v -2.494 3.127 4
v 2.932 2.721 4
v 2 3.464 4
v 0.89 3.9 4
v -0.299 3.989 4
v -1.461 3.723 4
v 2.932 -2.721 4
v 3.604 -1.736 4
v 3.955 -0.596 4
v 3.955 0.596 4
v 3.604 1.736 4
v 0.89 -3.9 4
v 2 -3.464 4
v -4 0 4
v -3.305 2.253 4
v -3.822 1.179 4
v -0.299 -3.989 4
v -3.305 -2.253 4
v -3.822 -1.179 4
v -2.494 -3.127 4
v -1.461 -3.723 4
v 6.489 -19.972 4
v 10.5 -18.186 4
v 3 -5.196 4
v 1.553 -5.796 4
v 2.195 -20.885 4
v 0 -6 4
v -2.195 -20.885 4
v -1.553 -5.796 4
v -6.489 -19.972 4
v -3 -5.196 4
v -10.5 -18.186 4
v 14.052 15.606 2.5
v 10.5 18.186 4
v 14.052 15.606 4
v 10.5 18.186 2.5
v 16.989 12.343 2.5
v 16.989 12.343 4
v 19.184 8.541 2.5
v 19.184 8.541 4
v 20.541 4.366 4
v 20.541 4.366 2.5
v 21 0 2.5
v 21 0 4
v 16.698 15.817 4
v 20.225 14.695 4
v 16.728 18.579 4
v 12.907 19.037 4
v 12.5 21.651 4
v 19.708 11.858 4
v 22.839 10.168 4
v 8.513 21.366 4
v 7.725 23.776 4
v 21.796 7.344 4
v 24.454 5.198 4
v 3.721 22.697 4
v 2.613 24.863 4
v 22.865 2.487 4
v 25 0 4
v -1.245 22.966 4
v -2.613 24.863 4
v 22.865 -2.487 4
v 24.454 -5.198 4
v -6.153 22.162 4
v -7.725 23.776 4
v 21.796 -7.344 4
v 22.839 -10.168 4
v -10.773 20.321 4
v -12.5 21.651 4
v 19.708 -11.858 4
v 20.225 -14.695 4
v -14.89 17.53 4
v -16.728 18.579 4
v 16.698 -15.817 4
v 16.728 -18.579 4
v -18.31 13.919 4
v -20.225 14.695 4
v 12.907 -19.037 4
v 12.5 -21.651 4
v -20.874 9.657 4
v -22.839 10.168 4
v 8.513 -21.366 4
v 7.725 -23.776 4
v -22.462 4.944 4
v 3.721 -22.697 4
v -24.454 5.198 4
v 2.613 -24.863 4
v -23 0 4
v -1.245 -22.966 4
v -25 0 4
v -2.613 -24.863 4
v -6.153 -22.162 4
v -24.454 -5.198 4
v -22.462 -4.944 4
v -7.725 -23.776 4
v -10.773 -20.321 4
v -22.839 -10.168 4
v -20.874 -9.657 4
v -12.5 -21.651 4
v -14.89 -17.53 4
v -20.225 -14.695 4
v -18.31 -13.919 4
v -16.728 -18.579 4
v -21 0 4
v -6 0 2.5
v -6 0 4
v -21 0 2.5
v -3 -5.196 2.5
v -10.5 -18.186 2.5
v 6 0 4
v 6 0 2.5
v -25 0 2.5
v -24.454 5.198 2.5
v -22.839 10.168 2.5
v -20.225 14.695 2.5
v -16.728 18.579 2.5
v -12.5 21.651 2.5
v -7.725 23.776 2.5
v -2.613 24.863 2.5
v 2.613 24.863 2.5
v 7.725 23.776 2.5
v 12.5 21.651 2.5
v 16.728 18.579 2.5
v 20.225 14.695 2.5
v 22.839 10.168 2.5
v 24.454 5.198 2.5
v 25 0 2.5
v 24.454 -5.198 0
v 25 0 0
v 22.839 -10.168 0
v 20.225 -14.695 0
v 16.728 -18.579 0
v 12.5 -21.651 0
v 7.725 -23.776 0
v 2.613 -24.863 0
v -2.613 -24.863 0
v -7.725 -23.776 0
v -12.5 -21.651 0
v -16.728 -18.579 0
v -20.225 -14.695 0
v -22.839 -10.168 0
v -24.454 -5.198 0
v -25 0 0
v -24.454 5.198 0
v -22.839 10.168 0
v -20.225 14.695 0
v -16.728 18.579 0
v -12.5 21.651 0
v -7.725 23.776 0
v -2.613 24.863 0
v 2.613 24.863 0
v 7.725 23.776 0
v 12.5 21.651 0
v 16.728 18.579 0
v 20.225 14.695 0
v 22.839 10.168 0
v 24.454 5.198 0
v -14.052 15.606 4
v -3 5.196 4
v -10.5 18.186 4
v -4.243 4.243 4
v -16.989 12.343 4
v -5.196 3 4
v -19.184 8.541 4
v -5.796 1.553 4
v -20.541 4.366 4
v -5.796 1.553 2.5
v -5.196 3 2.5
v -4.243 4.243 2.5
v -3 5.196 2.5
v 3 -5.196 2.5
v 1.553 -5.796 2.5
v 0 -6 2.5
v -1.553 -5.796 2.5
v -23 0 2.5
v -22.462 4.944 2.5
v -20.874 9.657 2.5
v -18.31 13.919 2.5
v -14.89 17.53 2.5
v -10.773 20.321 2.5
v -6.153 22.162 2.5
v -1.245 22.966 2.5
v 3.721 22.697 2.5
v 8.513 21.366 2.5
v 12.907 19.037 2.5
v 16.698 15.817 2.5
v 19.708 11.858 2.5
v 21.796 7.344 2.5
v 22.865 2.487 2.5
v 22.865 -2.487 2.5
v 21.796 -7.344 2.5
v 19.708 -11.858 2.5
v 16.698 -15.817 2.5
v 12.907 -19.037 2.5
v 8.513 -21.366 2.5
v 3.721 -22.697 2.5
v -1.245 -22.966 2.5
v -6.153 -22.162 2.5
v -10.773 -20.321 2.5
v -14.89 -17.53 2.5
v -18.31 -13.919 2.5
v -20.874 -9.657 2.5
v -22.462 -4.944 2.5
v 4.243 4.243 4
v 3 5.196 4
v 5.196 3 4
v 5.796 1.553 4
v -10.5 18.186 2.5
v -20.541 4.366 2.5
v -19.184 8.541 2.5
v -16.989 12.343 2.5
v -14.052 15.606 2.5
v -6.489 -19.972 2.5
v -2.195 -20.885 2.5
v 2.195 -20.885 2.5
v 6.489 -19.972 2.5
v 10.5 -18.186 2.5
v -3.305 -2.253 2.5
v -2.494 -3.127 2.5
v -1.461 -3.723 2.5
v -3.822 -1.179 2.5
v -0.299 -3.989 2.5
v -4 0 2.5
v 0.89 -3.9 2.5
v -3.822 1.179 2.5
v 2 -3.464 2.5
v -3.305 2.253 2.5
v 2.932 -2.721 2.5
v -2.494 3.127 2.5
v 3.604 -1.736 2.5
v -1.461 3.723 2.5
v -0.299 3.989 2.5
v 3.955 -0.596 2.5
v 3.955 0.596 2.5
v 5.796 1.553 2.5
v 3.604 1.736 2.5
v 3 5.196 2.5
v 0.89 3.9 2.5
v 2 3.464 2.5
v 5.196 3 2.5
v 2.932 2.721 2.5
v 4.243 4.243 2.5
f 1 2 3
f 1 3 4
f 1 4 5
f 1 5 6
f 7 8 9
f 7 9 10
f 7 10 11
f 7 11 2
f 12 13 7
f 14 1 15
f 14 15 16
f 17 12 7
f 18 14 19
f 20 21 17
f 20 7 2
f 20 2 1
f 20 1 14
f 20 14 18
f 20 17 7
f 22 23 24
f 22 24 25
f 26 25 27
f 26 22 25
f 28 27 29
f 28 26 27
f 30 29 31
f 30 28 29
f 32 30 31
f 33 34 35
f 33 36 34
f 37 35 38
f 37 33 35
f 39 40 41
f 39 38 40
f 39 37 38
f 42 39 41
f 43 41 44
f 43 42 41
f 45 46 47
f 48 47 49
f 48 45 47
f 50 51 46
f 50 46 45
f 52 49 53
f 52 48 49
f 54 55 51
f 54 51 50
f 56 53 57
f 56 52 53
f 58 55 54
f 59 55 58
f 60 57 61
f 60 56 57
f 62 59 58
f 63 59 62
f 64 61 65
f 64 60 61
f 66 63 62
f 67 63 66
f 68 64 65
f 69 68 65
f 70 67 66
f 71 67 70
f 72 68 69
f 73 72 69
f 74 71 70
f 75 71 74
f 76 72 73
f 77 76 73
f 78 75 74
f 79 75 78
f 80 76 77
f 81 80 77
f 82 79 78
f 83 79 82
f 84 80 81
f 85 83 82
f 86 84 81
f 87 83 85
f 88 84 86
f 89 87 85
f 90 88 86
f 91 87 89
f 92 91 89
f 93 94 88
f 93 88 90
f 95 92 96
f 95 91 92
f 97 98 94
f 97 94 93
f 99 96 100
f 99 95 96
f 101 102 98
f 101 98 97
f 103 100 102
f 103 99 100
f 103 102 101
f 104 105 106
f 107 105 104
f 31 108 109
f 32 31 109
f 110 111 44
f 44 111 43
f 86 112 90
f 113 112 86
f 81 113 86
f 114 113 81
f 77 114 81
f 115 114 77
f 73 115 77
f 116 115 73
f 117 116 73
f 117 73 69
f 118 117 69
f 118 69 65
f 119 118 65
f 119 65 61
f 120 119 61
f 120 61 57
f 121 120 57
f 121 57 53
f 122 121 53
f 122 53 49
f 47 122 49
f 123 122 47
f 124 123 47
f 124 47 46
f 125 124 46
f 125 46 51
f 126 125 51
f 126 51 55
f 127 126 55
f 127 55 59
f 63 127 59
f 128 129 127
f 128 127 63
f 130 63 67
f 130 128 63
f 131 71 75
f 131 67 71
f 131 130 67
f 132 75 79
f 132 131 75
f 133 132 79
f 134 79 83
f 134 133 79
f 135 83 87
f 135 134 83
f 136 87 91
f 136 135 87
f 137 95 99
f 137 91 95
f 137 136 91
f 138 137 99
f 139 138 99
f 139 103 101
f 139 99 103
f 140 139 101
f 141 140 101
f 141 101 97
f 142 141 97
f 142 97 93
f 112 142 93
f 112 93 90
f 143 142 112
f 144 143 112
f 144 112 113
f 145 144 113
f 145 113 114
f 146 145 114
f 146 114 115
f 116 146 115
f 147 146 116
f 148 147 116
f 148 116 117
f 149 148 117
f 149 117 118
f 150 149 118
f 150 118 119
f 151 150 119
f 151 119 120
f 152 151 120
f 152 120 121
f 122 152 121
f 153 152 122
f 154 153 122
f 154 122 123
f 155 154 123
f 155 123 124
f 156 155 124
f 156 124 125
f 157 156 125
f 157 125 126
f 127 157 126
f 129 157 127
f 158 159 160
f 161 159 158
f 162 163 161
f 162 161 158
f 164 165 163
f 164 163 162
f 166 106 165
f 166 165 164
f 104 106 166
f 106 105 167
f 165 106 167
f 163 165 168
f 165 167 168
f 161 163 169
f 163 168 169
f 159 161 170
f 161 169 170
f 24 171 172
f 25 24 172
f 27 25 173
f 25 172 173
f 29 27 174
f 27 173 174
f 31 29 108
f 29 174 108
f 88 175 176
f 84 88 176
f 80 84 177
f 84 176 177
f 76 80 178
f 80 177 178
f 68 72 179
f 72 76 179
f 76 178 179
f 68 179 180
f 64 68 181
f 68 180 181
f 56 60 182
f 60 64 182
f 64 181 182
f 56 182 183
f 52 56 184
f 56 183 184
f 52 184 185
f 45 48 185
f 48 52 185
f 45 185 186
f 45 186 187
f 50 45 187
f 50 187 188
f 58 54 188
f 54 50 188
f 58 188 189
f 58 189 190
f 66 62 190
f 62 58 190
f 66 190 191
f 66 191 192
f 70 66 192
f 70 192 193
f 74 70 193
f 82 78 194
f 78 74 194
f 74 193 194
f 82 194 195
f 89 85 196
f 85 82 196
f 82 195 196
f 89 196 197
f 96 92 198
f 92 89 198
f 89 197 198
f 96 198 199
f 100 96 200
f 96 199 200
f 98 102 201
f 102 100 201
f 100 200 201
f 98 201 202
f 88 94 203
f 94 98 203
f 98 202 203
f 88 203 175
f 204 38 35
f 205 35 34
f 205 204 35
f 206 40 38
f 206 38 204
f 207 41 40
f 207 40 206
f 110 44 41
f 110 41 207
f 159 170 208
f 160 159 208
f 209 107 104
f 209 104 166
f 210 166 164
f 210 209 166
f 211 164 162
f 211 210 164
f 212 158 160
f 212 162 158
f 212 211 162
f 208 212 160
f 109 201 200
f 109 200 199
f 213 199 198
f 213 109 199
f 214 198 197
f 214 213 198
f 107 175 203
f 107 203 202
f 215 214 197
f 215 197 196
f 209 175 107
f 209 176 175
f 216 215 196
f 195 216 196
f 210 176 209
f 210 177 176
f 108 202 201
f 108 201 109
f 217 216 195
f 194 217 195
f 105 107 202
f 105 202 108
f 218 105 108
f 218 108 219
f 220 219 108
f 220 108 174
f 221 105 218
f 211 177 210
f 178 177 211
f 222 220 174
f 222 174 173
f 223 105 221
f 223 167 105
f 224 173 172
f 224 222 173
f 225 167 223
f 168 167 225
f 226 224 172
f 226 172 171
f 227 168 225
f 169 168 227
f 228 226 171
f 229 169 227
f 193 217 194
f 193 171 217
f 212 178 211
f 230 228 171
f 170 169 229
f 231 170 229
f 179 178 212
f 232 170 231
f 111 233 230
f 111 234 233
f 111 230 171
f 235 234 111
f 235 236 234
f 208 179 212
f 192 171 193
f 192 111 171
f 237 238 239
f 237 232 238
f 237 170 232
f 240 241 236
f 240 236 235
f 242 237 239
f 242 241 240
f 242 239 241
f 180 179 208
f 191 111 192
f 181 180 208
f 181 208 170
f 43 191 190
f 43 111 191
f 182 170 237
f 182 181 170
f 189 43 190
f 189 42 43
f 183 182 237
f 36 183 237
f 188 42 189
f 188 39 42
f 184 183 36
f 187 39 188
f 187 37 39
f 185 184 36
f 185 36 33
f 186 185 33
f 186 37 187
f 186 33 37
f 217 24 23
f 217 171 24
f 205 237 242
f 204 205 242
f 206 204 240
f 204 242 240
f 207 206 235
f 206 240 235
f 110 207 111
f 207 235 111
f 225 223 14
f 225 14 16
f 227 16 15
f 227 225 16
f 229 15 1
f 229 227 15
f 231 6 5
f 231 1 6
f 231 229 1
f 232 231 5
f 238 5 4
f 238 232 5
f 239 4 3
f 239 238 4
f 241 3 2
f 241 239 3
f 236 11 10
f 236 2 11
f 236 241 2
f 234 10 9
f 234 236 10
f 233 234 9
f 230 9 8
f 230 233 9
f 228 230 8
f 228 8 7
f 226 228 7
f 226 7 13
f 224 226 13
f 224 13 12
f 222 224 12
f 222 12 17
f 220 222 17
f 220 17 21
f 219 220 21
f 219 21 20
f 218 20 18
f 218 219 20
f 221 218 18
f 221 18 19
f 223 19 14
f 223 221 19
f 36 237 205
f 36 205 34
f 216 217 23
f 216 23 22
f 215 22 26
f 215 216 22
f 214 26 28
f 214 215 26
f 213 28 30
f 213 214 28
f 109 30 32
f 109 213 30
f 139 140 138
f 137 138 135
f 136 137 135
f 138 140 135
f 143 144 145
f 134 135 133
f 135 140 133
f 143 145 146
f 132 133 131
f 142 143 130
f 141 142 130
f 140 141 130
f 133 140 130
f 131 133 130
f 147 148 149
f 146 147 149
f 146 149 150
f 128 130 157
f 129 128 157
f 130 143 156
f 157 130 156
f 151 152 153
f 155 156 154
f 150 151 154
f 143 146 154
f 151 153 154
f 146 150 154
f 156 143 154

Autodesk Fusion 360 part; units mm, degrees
sketch "Sketch2" plane through (0, 0, 0) normal (0, 0, 1) x (1, 0, 0)
  circle A0 centre (0, 0) radius 25
  dimension "d3" = 50
extrude "Extrude2" add sketch "Sketch2" along normal blind 2.5
sketch "Sketch3" plane through (0, 0, 2.5) normal (0, 0, 1) x (-1, 0, 0)
  circle A0 centre (0, 0) radius 25
  circle A1 centre (0, 0) radius 23
  circle A2 centre (0, 0) radius 21
  circle A3 centre (0, 0) radius 4
  line L0 (6, 0) -> (3, 5.1962) construction
  line L1 (3, 5.1962) -> (-3, 5.1962) construction
  line L2 (-3, 5.1962) -> (-6, 0) construction
  line L3 (-6, 0) -> (-3, -5.1962) construction
  line L4 (-3, -5.1962) -> (3, -5.1962) construction
  line L5 (3, -5.1962) -> (6, 0) construction
  line L6 (-3, -5.1962) -> (-10.5, -18.1865)
  line L7 (-6, 0) -> (-21, 0)
  line L8 (-3, 5.1962) -> (-10.5, 18.1865)
  line L9 (3, 5.1962) -> (10.5, 18.1865)
  line L10 (6, 0) -> (21, 0)
  line L11 (3, -5.1962) -> (10.5, -18.1865)
  line L12 (21, 0) -> (10.5, -18.1865) construction
  line L13 (-10.5, -18.1865) -> (-21, 0) construction
  line L14 (-10.5, 18.1865) -> (-21, 0) construction
  line L15 (-10.5, -18.1865) -> (10.5, -18.1865) construction
  line L16 (21, 0) -> (10.5, 18.1865) construction
  circle A4 centre (0, 0) radius 6
  dimension "d6" = -2
  dimension "d7" = -4
  dimension "d8" = 8
  dimension "d9" = 6
extrude "Extrude3" add sketch "Sketch3" along normal blind 1.5 contours A0 | A2 L10 L11 A4 | A2 L8 L9 A4 | A2 L6 L7 A4
extrude "Extrude4" add sketch "Sketch3" along normal blind 1.5 contours A3
